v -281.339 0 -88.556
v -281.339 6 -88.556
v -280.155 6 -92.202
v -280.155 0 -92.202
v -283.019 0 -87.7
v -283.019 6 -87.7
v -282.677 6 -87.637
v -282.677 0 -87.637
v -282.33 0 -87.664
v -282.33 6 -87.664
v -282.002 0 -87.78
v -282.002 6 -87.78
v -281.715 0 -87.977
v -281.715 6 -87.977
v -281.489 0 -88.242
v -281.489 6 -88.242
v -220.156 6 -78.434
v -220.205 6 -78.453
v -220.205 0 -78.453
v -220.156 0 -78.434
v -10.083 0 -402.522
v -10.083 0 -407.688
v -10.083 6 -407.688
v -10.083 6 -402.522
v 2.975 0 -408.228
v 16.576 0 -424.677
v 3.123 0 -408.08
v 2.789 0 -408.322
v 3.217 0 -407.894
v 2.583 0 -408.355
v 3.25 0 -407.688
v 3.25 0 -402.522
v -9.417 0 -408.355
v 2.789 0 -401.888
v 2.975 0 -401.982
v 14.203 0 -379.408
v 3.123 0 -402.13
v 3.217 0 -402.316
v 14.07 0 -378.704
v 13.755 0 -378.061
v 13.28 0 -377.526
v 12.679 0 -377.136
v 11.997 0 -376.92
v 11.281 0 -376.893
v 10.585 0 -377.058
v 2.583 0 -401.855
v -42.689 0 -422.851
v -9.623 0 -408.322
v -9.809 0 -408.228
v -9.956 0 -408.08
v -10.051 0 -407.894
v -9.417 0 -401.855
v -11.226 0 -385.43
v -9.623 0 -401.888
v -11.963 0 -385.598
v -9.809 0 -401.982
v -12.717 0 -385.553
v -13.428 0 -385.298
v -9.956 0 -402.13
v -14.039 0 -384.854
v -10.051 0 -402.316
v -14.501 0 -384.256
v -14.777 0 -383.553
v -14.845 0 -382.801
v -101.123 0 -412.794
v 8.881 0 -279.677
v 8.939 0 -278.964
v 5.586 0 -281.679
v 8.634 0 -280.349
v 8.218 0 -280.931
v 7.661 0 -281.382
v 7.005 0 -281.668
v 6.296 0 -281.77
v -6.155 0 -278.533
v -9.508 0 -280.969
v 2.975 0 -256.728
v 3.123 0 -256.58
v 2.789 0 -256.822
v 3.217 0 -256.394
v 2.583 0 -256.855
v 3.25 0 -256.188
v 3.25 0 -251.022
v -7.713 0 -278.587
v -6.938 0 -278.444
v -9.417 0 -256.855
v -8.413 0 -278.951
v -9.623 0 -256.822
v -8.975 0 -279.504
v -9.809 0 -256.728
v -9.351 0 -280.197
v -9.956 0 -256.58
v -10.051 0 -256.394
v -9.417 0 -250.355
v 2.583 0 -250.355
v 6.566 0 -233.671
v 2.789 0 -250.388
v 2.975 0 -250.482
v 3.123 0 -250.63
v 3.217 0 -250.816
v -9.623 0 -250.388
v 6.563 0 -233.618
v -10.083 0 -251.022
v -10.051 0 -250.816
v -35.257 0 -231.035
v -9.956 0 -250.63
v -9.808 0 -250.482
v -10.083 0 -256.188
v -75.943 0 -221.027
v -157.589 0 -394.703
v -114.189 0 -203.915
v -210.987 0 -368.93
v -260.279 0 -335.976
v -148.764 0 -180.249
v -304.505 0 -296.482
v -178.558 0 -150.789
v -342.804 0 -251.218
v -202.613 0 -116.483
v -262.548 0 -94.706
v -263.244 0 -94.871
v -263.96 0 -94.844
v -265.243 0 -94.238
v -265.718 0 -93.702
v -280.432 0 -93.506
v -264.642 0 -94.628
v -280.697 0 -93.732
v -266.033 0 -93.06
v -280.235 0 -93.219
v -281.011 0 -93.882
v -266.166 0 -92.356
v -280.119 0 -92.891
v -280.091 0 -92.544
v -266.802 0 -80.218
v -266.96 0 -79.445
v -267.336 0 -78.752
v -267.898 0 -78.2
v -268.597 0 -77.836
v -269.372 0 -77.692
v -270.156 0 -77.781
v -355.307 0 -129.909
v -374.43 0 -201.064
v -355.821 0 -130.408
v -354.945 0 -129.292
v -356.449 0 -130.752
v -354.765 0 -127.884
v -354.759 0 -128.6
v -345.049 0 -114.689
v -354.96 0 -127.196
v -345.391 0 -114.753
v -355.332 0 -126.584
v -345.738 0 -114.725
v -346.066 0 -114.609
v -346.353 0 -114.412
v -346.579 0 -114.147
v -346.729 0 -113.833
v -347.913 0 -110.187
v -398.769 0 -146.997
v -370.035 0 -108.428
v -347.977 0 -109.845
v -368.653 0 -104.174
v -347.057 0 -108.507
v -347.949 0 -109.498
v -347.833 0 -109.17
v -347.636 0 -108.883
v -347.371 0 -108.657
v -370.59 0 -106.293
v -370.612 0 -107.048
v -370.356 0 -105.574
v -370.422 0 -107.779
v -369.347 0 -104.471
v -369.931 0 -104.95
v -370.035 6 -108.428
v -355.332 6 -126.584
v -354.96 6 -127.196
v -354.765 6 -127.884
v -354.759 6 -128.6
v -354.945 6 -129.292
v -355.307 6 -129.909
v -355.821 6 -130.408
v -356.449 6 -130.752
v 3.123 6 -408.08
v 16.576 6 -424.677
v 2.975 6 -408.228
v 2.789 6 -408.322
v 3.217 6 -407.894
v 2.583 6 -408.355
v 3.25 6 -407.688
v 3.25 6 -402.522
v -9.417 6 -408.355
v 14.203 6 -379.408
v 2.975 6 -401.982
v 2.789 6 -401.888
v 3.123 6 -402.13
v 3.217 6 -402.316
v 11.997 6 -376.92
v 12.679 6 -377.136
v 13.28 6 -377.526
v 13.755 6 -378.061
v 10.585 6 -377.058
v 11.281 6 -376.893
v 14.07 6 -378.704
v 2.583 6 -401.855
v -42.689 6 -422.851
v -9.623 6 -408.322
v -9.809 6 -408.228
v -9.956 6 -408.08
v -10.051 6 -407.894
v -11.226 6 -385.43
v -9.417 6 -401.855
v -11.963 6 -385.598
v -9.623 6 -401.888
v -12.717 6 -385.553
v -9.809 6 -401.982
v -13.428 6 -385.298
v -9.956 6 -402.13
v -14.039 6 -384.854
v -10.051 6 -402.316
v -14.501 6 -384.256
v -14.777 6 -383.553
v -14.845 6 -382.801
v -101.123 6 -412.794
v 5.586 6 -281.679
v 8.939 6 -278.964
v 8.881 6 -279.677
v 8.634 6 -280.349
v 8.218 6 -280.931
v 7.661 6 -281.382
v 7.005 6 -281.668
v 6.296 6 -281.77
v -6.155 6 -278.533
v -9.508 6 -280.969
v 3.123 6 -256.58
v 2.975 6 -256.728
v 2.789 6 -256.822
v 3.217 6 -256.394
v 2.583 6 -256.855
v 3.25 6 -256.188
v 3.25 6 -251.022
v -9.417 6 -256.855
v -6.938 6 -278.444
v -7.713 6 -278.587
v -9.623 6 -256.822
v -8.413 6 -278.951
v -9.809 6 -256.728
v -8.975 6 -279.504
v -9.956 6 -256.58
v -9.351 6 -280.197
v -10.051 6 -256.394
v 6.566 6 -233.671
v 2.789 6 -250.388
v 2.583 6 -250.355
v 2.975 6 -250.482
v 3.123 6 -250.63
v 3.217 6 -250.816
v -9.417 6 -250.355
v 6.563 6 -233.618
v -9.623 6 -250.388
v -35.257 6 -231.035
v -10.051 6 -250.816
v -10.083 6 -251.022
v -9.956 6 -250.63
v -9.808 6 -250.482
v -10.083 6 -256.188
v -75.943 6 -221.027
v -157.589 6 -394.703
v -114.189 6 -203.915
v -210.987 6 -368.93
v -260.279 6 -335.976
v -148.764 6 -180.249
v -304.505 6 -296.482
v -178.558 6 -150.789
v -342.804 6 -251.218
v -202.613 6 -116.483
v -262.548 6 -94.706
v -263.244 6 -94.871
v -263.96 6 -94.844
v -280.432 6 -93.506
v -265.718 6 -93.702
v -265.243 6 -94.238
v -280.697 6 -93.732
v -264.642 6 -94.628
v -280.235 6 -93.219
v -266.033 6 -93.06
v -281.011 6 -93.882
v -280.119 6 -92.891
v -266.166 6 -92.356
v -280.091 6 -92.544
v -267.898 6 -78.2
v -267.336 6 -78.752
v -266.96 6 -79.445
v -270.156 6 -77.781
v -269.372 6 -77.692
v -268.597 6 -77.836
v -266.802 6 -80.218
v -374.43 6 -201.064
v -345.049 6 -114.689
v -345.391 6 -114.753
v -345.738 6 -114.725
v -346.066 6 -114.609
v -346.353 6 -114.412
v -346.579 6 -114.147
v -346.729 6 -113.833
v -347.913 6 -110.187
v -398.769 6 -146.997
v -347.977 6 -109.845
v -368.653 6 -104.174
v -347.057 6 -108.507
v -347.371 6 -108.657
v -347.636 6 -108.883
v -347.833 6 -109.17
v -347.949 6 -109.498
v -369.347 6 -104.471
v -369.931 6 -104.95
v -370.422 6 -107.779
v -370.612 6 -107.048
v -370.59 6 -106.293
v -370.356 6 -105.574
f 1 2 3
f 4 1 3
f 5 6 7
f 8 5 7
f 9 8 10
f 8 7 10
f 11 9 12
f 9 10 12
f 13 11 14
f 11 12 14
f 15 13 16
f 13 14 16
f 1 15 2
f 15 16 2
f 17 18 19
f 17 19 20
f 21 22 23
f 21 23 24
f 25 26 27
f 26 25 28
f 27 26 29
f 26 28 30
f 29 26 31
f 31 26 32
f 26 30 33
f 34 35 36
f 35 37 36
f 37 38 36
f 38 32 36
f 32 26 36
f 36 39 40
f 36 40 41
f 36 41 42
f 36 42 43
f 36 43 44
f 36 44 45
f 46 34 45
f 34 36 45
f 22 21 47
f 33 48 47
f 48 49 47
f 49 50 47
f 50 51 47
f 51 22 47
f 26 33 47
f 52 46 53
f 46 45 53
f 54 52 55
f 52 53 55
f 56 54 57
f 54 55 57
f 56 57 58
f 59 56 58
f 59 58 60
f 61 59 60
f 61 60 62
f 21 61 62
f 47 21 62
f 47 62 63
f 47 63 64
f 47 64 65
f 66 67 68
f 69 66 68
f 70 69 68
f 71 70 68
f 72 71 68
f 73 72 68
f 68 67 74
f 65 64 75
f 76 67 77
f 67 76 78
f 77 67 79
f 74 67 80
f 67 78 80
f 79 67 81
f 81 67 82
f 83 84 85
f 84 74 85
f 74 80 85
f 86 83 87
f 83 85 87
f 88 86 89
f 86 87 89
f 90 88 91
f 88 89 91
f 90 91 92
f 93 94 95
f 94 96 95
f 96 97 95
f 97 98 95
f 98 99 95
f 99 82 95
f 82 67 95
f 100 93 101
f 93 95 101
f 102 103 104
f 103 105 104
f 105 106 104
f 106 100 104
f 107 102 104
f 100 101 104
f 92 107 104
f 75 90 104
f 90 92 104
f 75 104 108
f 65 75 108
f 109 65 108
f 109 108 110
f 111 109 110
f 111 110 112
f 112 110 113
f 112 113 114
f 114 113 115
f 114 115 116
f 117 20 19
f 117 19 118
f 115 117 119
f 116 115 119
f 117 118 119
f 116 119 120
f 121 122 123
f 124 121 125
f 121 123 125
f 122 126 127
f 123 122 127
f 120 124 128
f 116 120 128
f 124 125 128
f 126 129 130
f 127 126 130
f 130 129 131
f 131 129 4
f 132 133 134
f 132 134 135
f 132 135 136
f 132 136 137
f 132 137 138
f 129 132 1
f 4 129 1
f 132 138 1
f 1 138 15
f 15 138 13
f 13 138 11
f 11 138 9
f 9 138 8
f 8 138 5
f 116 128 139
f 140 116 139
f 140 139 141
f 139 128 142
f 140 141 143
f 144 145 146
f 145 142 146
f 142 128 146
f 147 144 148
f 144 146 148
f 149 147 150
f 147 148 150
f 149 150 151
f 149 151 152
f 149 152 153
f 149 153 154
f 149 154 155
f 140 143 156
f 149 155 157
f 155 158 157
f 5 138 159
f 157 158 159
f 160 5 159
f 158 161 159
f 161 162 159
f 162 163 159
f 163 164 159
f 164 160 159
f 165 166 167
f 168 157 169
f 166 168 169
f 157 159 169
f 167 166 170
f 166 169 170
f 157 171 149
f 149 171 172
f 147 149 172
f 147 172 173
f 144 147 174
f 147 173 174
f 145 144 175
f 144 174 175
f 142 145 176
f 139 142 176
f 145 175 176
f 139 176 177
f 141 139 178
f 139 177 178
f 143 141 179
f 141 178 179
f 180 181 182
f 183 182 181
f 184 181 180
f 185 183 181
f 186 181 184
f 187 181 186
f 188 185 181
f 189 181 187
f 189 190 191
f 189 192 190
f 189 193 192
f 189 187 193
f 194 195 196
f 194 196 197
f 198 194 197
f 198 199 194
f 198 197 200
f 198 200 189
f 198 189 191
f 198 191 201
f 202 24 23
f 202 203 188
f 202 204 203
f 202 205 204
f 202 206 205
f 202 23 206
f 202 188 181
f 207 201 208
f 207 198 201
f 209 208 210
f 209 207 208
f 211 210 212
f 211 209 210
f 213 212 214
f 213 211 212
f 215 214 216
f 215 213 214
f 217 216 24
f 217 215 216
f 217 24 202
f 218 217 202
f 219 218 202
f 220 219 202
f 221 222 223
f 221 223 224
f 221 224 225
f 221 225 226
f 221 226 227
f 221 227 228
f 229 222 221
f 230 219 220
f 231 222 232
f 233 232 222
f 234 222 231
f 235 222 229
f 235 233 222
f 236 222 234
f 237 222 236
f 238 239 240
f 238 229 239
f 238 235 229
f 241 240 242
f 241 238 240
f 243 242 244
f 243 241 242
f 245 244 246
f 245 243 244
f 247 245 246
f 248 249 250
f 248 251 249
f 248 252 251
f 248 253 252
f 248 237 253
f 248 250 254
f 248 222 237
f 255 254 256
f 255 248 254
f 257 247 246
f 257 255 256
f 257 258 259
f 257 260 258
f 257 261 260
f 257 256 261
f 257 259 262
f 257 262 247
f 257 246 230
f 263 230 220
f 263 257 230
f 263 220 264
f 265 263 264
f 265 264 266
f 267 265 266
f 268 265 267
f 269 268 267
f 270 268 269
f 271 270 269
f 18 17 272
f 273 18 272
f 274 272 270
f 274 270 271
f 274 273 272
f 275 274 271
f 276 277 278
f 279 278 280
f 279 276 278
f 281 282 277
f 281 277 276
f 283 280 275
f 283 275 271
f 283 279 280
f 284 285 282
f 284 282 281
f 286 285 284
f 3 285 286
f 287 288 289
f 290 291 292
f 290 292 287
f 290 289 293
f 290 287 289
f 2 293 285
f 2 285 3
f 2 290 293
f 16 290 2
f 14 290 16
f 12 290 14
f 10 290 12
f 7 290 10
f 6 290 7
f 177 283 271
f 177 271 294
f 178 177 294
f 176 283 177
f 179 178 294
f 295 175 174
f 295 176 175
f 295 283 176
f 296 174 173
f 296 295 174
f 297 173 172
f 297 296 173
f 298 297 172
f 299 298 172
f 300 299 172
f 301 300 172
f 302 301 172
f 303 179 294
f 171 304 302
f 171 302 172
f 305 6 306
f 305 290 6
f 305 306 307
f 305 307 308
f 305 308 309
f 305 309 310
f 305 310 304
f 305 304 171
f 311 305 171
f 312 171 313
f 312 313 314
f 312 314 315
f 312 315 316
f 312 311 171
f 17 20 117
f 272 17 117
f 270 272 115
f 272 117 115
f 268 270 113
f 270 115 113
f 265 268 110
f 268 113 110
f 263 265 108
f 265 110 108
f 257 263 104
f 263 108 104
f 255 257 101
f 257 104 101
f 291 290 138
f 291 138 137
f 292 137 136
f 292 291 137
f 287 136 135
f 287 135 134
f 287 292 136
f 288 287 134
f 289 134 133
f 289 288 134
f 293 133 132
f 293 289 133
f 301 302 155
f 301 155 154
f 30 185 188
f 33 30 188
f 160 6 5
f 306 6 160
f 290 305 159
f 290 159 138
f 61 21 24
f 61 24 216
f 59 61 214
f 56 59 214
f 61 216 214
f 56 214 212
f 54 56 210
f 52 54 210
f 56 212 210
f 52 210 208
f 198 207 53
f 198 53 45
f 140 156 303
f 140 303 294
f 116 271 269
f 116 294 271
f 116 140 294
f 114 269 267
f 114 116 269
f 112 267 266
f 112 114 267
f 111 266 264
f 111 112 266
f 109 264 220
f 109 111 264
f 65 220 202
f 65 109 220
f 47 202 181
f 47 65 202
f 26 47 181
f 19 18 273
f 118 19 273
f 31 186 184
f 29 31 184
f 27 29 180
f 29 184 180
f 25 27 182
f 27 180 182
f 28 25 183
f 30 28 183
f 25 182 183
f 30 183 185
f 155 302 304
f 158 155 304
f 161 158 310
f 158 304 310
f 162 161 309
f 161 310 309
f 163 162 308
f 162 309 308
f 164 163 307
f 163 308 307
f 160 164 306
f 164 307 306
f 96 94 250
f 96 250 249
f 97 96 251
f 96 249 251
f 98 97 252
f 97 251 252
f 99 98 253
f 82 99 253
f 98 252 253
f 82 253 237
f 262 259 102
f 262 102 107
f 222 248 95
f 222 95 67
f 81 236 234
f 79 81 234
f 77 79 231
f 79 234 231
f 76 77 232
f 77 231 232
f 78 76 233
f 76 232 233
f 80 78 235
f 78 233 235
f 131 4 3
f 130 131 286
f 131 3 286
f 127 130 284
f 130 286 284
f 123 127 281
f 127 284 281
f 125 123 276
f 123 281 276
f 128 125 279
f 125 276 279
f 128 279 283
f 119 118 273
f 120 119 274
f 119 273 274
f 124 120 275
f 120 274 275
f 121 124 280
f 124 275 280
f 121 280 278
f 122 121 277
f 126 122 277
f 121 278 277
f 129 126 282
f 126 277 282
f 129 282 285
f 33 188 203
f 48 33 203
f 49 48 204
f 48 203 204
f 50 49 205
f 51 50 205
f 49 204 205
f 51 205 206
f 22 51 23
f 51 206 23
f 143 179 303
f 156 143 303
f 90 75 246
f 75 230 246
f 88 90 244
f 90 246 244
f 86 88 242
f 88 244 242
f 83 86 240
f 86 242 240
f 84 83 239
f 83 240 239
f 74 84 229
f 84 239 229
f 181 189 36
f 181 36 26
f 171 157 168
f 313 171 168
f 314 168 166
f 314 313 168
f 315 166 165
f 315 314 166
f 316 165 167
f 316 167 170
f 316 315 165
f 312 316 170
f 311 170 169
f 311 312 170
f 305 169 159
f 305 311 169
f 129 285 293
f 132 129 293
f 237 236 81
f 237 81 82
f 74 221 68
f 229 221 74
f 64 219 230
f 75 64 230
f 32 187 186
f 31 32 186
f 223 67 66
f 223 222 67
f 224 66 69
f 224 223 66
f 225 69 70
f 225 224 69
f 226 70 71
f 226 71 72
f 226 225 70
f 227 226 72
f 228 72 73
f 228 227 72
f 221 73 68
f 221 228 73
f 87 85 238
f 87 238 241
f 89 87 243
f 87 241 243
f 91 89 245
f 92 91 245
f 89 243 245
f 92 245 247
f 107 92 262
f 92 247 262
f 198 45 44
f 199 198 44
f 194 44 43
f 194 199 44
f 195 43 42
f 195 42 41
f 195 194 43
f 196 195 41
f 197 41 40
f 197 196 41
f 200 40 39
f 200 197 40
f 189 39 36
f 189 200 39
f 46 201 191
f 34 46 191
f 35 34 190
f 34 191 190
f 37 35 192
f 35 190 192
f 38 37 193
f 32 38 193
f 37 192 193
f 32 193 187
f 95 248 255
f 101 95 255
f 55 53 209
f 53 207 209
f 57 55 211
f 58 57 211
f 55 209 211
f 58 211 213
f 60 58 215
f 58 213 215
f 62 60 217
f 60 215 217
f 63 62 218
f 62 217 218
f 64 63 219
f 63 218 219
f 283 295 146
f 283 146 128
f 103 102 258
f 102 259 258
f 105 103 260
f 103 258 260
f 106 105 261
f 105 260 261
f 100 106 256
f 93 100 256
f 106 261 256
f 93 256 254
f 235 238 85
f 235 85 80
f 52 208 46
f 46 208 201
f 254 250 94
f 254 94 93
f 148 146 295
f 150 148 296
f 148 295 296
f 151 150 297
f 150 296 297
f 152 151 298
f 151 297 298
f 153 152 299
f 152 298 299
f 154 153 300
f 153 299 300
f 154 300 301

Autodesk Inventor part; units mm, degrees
ref_plane "YZ Plane" through (0, 0, 0) normal (1, 0, 0) x (0, 1, 0)
ref_plane "XZ Plane" through (0, 0, 0) normal (0, 1, 0) x (-1, 0, 0)
ref_plane "XY Plane" through (0, 0, 0) normal (0, 0, 1) x (1, 0, 0)
sketch "Sketch1" plane through (0, 0, 0) normal (0, 1, 0) x (-1, 0, 0)
  circle A0 centre (0, 0) radius 425
  circle A1 centre (0, 0) radius 233.71
  dimension "d84" = 467.42
  dimension "d85" = 850
extrude "Extrusion3" add sketch "Sketch1" along normal blind 6
sketch "Sketch2" plane through (0, 6, 0) normal (0, 1, 0) x (1, 0, 0)
  circle A0 centre (0, 0) radius 329.355 construction
  line L0 (3.25, 363.0217) -> (3.25, 295.6883)
  line L1 (-3.25, 295.6883) -> (-3.25, 363.0217)
  arc A1 (-3.25, 295.6883) -> (-1.9167, 294.355) centre (-1.9167, 295.6883) ccw
  arc A2 (1.9167, 294.355) -> (3.25, 295.6883) centre (1.9167, 295.6883) ccw
  arc A3 (-1.9167, 364.355) -> (-3.25, 363.0217) centre (-1.9167, 363.0217) ccw
  arc A4 (3.25, 363.0217) -> (1.9167, 364.355) centre (1.9167, 363.0217) ccw
  line L2 (-1.9167, 364.355) -> (1.9167, 364.355)
  line L3 (-1.9167, 294.355) -> (1.9167, 294.355)
  line L4 (0, 294.355) -> (0, 329.355) construction
  line L5 (0, 364.355) -> (0, 329.355) construction
  line L6 (0, 364.355) -> (0, 294.355) construction
  line L7 (175.0629, -238.5433) -> (171.9617, -240.7965)
  arc A5 (176.9253, -238.8383) -> (175.0629, -238.5433) centre (175.8467, -239.622) ccw
  arc A6 (171.9617, -240.7965) -> (171.6667, -242.6589) centre (172.7454, -241.8752) ccw
  line L8 (173.0175, -238.1382) -> (193.59, -266.4538) construction
  line L9 (211.2443, -297.1327) -> (171.6667, -242.6589)
  line L10 (176.9253, -238.8383) -> (216.5029, -293.3121)
  line L11 (214.1625, -294.7694) -> (173.0175, -238.1382) construction
  line L12 (214.1625, -294.7694) -> (193.59, -266.4538) construction
  arc A7 (211.2443, -297.1327) -> (213.1067, -297.4277) centre (212.323, -296.349) ccw
  line L13 (216.2079, -295.1745) -> (213.1067, -297.4277)
  arc A8 (216.2079, -295.1745) -> (216.5029, -293.3121) centre (215.4242, -294.0958) ccw
  line L14 (280.1548, 92.2019) -> (281.3393, 88.5562)
  arc A9 (281.0108, 93.882) -> (280.1548, 92.2019) centre (281.4229, 92.614) ccw
  arc A10 (281.3393, 88.5562) -> (283.0194, 87.7002) centre (282.6074, 88.9682) ccw
  line L15 (279.9482, 90.9607) -> (313.2352, 101.7763) construction
  line L16 (347.0573, 108.5073) -> (283.0194, 87.7002)
  line L17 (281.0108, 93.882) -> (345.0486, 114.6892)
  line L18 (346.5222, 112.5919) -> (279.9482, 90.9607) construction
  line L19 (346.5222, 112.5919) -> (313.2352, 101.7763) construction
  arc A11 (347.0573, 108.5073) -> (347.9133, 110.1874) centre (346.6452, 109.7754) ccw
  line L20 (346.7287, 113.8331) -> (347.9133, 110.1874)
  arc A12 (346.7287, 113.8331) -> (345.0486, 114.6892) centre (345.4607, 113.4211) ccw
  dimension "d86" = 658.71
  dimension "d21" = 6.5
  dimension "d24" = 2.6667
  dimension "d25" = 2.6667
  dimension "d32" = 1.3333
  dimension "d33" = 1.3333
  dimension "d162" = 70
  dimension "d163" = 294.355
  dimension "d165" = 3.25
extrude "Extrusion4" cut sketch "Sketch2" against normal through all
sketch "Sketch3" plane through (0, 6, 0) normal (0, 1, 0) x (1, 0, 0)
  arc A0 (-131.3389, -404.1968) -> (131.3445, -404.195) centre (0, 0) ccw
  arc A1 (-77.7244, -128.3741) -> (77.7297, -128.3709) centre (0, 0) ccw
  line L0 (-122.1811, -173.696) -> (-161.3589, -227.6196)
  line L1 (-131.3389, -404.1968) -> (-77.7244, -128.3741)
  line L2 (0, 0) -> (0, -341.2918)
  line L3 (131.3445, -404.195) -> (77.7297, -128.3709)
  line L4 (210.5535, -295.3313) -> (171.3679, -241.3969) projected
  dimension "d52" = 25
  dimension "d87" = 150.07
  dimension "d88" = 425
  dimension "d89" = 25
  dimension "d90" = 11
  dimension "d91" = 11
sketch "Sketch5" plane through (0, 6, 0) normal (0, 1, 0) x (1, 0, 0)
  line L0 (3.25, 363.0217) -> (3.25, 295.6883) projected
  line L1 (5.5862, 281.6788) -> (-6.155, 278.5328)
  line L2 (-11.2263, 385.43) -> (10.5847, 377.0575)
  line L3 (6.5657, 233.6709) -> (8.9394, 278.9635)
  line L4 (14.2034, 379.4075) -> (16.5771, 424.7001)
  arc A0 (10.5847, 377.0575) -> (14.2034, 379.4075) centre (11.5404, 379.5471) ccw
  arc A1 (8.9394, 278.9635) -> (5.5862, 281.6788) centre (6.2763, 279.103) ccw
  arc A2 (-11.2263, 385.43) -> (-14.8449, 382.8009) centre (-12.1819, 382.9405) ccw
  line L5 (-3.25, 295.6883) -> (-3.25, 363.0217) projected
  line L6 (-14.8449, 382.8009) -> (-9.5081, 280.969)
  arc A3 (-9.5081, 280.969) -> (-6.155, 278.5328) centre (-6.8451, 281.1086) ccw
  line L7 (-1.9167, 294.355) -> (1.9167, 294.355) projected
  line L8 (1.9167, 364.355) -> (-1.9167, 364.355) projected
  line L9 (16.5771, 424.7001) -> (16.5774, 424.7058)
  line L10 (6.5657, 233.6709) -> (6.5621, 233.6028)
  circle A4 centre (0, 0) radius 425
  circle A5 centre (0, 0) radius 233.71
  line L11 (-356.4489, 130.7516) -> (-398.7912, 147.0053)
  arc A6 (-355.3322, 126.5839) -> (-356.4489, 130.7516) centre (-357.4046, 128.2621) ccw
  line L12 (-370.0348, 108.4276) -> (-355.3322, 126.5839)
  arc A7 (-370.0348, 108.4276) -> (-368.6526, 104.1736) centre (-367.9624, 106.7494) ccw
  line L13 (-368.6526, 104.1736) -> (-270.1556, 77.7814)
  arc A8 (-270.1556, 77.7814) -> (-266.8024, 80.2177) centre (-269.4654, 80.3572) ccw
  line L14 (-266.1663, 92.3563) -> (-266.8024, 80.2177)
  arc A9 (-262.5476, 94.7063) -> (-266.1663, 92.3563) centre (-263.5032, 92.2167) ccw
  line L15 (-220.2053, 78.4526) -> (-262.5476, 94.7063)
  line L16 (-220.2053, 78.4526) -> (-220.1417, 78.4282)
  line L17 (-398.7912, 147.0053) -> (-398.7965, 147.0073)
  line L18 (-142.66, -185.1845) -> (-142.6172, -185.1316)
  line L19 (-263.0436, -333.8458) -> (-263.0472, -333.8502)
  line L20 (132.0366, -192.9029) -> (131.9995, -192.8458)
  line L21 (236.2213, -353.3334) -> (236.2244, -353.3381)
  line L22 (365.2271, 103.7351) -> (409.0364, 115.4738)
  arc A10 (361.8739, 106.4505) -> (365.2271, 103.7351) centre (364.5369, 106.3109) ccw
  line L23 (363.0966, 129.7812) -> (361.8739, 106.4505)
  arc A11 (363.0966, 129.7812) -> (359.478, 132.4103) centre (360.4336, 129.9208) ccw
  line L24 (359.478, 132.4103) -> (264.2793, 95.867)
  arc A12 (264.2793, 95.867) -> (262.9985, 91.9251) centre (265.2349, 93.3774) ccw
  line L25 (269.6187, 81.7308) -> (262.9985, 91.9251)
  arc A13 (268.0724, 77.7026) -> (269.6187, 81.7308) centre (267.3822, 80.2784) ccw
  line L26 (224.2631, 65.9639) -> (268.0724, 77.7026)
  line L27 (224.2631, 65.9639) -> (224.1973, 65.9463)
  line L28 (409.0364, 115.4738) -> (409.0419, 115.4753)
  line L29 (0, -233.71) -> (0, -425)
  arc A14 (131.3445, -404.195) -> (-131.3389, -404.1968) centre (0, 0) ccw projected
  point P0 (-425, 0)
  point P1 (-425, 0)
  point P2 (-398.7693, 146.9969)
  point P3 (-220.1557, 78.4336)
  point P4 (16.5759, 424.6766)
  point P5 (6.5629, 233.6178)
  dimension "d63" = 2.6667
  dimension "d64" = 3
  dimension "d66" = 3
  dimension "d67" = 2.6667
  dimension "d68" = 2.6667
  dimension "d70" = 72
  dimension "d71" = 72
sketch "Sketch6" plane through (0, 6, 0) normal (0, 1, 0) x (1, 0, 0)
  line L0 (237.9351, -331.8846) -> (247.6433, -324.8312)
  line L1 (243.8227, -319.5725) -> (234.1145, -326.626)
  line L2 (210.5535, -295.3313) -> (171.3679, -241.3969) projected
  line L3 (215.5172, -293.3731) -> (212.416, -295.6263) projected
  arc A0 (244.7539, -319.72) -> (243.8227, -319.5725) centre (244.2145, -320.1119) ccw
  arc A1 (247.6433, -324.8312) -> (247.7908, -323.9) centre (247.2514, -324.2918) ccw
  arc A2 (237.0039, -331.7371) -> (237.9351, -331.8846) centre (237.5432, -331.3452) ccw
  arc A3 (234.1145, -326.626) -> (233.967, -327.5572) centre (234.5063, -327.1653) ccw
  line L4 (233.967, -327.5572) -> (237.0039, -331.7371)
  line L5 (247.7908, -323.9) -> (244.7539, -319.72)
  line L6 (171.3679, -241.3969) -> (210.5535, -295.3313) projected
  line L7 (190.9607, -268.3641) -> (196.2193, -264.5435)
  line L8 (215.8122, -291.5107) -> (176.6265, -237.5763) projected
  line L9 (145.065, -204.0599) -> (154.7732, -197.0065)
  line L10 (158.5938, -202.2651) -> (148.8856, -209.3185)
  arc A4 (158.5938, -202.2651) -> (158.7413, -201.3339) centre (158.202, -201.7257) ccw
  arc A5 (155.7044, -197.154) -> (154.7732, -197.0065) centre (155.1651, -197.5458) ccw
  arc A6 (145.065, -204.0599) -> (144.9175, -204.9911) centre (145.4569, -204.5992) ccw
  arc A7 (147.9544, -209.171) -> (148.8856, -209.3185) centre (148.4938, -208.7792) ccw
  line L11 (147.9544, -209.171) -> (144.9175, -204.9911)
  line L12 (155.7044, -197.154) -> (158.7413, -201.3339)
  point P0 (0, 0)
  dimension "d104" = 6.5
  dimension "d105" = 12
  dimension "d108" = 1.3333
  dimension "d109" = 1.3333
  dimension "d110" = 1.3333
  dimension "d111" = 1.3333
  dimension "d112" = 0
  dimension "d149" = 145
  dimension "d150" = 90
  dimension "d151" = 90
  dimension "d152" = 90
  dimension "d153" = 90
extrude "Extrusion7" cut sketch "Sketch6" against normal through all
pattern_circular "Circular Pattern2" count 2 over 72 about axis through (0, -10, 0) along (0, 1, 0) of "Extrusion7"
pattern_circular "Circular Pattern3" count 2 over 144 about axis through (0, -10, 0) along (0, 1, 0) of "Extrusion7"
mirror "Mirror3" about plane through (0, 0, 0) normal (1, 0, 0) of "Extrusion7"
extrude "Extrusion10" cut sketch "Sketch3" against normal blind 10
mirror "Mirror4" about plane through (0, 0, 0) normal (1, 0, 0) of "Extrusion4"
pattern_circular "Circular Pattern4" count 2 over 144 about axis through (0, -10, 0) along (0, -1, 0) of "Extrusion7"
extrude "Extrusion11" cut sketch "Sketch5" against normal through all contours L1 A3 L6 A2 L2 A0 L4 A4 L22 A10 L23 A11 L24 A12 L25 A13 L26 L27 A5 L10 L3 A1 | L27 L26 A13 L25 A12 L24 A11 L23 A10 L22 A4 L29 A5 | A5 L29 A4 L11 A6 L12 A7 L13 A8 L14 A9 L15 L16
equation "\"BendRadius\" = Thickness"
equation "\"BendReliefWidth\" = Thickness"
equation "\"BendReliefDepth\" = 0.5 * Thickness"
equation "\"CornerReliefSize\" = 4 * Thickness"
equation "\"MinimumRemnant\" = 2 * Thickness"
equation "\"TransitionRadius\" = BendRadius"
equation "\"JacobiRadiusSize\" = BendRadius"
equation "\"GapSize\" = Thickness"
equation "\"Thickness\" = 0.5"
properties part number "Ring C2" material "Wood (Maple)"
